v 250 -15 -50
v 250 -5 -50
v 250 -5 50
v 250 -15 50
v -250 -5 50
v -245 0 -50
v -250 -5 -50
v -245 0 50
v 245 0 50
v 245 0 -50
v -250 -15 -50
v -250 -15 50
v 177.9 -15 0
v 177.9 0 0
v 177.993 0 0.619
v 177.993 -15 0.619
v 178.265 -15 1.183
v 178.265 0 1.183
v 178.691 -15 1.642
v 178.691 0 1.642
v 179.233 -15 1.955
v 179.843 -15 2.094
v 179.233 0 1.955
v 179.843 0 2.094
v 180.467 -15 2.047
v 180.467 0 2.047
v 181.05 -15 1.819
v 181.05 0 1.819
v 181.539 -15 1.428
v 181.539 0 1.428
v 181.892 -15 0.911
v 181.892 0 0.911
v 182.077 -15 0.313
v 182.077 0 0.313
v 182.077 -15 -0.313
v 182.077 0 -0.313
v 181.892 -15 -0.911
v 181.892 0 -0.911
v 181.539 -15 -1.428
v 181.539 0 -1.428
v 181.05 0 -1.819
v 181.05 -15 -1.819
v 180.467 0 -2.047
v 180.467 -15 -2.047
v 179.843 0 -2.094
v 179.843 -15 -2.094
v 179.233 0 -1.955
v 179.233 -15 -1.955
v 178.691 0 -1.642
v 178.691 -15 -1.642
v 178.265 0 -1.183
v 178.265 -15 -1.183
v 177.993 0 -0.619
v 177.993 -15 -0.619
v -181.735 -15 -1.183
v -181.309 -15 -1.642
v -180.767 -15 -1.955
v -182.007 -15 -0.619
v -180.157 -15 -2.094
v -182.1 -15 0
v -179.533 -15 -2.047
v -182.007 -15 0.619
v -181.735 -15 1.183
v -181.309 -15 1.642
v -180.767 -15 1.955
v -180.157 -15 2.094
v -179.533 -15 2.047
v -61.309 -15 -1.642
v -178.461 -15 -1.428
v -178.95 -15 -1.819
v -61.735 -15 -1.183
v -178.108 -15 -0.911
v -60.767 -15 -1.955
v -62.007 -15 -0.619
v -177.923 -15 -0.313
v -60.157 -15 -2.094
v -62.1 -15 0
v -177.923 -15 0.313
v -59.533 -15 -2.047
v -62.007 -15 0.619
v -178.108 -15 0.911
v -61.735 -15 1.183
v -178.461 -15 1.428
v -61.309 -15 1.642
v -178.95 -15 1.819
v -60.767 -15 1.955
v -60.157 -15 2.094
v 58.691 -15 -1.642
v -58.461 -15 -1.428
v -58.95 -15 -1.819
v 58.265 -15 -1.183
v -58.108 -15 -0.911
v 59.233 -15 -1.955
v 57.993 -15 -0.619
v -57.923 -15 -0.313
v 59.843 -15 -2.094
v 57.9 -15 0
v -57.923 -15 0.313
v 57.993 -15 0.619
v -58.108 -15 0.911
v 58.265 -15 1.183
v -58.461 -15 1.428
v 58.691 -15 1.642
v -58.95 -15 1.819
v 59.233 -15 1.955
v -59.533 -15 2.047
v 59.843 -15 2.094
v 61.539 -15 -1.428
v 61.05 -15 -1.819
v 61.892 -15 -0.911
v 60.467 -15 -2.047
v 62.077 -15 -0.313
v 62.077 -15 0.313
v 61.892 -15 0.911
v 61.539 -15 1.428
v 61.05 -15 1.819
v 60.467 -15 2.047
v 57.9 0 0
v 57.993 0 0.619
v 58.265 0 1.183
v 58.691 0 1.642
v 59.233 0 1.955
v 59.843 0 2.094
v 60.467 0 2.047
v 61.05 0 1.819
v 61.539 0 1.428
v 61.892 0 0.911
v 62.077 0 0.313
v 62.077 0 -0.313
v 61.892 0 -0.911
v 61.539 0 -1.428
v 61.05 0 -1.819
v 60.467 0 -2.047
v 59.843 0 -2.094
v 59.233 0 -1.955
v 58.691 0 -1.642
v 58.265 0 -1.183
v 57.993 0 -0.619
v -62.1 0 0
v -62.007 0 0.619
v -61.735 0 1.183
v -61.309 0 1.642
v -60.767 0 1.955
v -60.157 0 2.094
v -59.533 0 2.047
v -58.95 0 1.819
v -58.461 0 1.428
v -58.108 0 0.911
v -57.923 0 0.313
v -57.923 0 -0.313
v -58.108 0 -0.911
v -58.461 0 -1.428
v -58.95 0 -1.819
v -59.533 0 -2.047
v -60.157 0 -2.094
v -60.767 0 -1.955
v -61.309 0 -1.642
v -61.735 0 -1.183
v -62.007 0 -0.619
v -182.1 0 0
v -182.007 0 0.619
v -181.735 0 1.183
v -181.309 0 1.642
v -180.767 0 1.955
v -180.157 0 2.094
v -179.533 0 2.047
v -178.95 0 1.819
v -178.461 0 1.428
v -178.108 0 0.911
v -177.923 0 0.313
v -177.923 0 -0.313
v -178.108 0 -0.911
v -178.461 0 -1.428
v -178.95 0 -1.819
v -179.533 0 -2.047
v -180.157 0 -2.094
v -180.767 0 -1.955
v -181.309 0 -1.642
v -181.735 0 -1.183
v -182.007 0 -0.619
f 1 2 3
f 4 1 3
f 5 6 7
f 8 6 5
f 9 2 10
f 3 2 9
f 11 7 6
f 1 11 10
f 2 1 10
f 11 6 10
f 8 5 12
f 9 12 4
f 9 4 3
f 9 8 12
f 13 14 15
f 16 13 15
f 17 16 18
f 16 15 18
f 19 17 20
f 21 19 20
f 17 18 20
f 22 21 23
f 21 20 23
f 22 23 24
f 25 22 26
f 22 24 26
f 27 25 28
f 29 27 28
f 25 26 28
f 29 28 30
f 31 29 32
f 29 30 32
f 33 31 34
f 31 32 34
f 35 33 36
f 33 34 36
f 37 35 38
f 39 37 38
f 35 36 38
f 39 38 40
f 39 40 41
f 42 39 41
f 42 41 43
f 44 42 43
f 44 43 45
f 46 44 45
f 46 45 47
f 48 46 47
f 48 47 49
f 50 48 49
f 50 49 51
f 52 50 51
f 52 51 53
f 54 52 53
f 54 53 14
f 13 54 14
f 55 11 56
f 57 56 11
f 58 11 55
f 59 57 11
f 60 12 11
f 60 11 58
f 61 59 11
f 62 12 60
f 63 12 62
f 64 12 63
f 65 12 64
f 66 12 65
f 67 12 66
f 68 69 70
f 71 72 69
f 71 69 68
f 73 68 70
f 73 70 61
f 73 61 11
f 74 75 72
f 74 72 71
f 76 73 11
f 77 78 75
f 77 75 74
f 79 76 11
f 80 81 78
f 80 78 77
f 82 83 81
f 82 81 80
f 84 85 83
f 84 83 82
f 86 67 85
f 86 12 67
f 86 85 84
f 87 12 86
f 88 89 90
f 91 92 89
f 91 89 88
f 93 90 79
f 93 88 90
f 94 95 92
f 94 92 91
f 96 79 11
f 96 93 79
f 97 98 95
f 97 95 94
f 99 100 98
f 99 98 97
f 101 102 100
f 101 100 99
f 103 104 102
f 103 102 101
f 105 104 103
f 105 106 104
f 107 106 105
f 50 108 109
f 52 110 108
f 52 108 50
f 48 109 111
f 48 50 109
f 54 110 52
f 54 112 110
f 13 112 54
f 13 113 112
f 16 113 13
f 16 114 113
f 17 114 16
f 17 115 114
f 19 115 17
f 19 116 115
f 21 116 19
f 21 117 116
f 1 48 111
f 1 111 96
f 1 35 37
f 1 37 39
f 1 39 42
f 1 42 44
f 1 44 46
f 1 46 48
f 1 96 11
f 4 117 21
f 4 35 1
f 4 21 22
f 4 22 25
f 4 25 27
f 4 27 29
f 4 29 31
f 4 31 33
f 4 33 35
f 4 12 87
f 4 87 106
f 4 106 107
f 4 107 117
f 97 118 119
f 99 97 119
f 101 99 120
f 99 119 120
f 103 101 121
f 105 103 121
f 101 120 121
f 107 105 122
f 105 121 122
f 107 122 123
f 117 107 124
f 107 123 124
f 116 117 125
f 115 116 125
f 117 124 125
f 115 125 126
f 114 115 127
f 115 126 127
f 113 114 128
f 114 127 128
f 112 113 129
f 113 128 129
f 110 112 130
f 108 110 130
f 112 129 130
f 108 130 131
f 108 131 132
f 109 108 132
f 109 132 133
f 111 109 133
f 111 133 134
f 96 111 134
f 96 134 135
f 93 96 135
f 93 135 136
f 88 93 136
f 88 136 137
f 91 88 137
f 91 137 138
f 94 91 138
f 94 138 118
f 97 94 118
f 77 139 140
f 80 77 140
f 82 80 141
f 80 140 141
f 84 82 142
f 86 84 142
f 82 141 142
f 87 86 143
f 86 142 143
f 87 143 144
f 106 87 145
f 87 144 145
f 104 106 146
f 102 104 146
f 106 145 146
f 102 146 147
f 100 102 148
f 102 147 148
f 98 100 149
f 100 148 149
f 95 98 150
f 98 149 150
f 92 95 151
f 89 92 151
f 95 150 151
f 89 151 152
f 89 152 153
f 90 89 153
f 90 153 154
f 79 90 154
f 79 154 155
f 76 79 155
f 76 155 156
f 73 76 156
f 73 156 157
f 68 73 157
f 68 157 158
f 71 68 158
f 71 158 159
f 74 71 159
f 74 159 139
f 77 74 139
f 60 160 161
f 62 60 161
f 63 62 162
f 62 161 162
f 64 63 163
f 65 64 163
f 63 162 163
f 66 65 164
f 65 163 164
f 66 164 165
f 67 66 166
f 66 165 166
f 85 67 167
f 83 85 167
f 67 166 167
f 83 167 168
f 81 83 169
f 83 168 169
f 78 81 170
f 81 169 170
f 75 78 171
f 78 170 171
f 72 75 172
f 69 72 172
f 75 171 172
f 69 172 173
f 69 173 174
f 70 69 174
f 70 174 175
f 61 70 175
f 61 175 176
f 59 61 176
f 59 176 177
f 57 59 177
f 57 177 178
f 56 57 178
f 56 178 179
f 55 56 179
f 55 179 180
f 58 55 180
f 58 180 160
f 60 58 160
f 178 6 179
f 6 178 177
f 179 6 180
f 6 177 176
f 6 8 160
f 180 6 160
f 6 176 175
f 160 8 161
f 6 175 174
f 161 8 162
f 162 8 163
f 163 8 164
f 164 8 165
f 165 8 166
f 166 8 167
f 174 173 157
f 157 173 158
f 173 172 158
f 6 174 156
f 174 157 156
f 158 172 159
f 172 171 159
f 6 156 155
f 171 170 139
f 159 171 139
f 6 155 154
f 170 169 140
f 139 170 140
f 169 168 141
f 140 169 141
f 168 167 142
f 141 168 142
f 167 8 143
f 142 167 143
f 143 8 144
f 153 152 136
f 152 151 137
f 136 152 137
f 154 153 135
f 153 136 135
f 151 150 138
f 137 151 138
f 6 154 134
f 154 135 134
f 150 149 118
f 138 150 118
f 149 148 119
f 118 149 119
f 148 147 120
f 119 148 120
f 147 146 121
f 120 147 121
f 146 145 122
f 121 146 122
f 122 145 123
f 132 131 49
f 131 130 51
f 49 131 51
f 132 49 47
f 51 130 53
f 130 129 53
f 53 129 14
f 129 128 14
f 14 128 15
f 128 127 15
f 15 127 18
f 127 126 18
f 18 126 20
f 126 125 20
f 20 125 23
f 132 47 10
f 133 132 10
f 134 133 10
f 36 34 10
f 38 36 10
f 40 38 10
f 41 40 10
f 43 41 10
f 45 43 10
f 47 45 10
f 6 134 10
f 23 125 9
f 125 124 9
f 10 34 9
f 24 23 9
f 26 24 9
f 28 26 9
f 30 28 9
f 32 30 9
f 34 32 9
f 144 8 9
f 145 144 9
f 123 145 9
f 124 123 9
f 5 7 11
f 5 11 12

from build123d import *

# Parameters (mm, degrees)
F0_W     = 500
F0_H     = 100
F1_DEPTH = 15
F3_D     = 4.2
F4_SIZE  = 5


with BuildPart() as f1:
    # F0 (on Front) → F1 (new body)
    with BuildSketch(Plane.XZ):
        Rectangle(F0_W, F0_H)
    extrude(amount=F1_DEPTH)

    # F3 (through all)
    with Locations(Plane.XZ.offset(15)):
        with Locations((-180, 0), (-60, 0), (60, 0), (180, 0)):
            Hole(F3_D / 2)

    # F4
    f4_edges = [f1.edges().sort_by_distance(p)[0] for p in [
        (-250, 0, 0),
        (250, 0, 0),
    ]]
    chamfer(f4_edges, length=F4_SIZE)


solid = f1.part
